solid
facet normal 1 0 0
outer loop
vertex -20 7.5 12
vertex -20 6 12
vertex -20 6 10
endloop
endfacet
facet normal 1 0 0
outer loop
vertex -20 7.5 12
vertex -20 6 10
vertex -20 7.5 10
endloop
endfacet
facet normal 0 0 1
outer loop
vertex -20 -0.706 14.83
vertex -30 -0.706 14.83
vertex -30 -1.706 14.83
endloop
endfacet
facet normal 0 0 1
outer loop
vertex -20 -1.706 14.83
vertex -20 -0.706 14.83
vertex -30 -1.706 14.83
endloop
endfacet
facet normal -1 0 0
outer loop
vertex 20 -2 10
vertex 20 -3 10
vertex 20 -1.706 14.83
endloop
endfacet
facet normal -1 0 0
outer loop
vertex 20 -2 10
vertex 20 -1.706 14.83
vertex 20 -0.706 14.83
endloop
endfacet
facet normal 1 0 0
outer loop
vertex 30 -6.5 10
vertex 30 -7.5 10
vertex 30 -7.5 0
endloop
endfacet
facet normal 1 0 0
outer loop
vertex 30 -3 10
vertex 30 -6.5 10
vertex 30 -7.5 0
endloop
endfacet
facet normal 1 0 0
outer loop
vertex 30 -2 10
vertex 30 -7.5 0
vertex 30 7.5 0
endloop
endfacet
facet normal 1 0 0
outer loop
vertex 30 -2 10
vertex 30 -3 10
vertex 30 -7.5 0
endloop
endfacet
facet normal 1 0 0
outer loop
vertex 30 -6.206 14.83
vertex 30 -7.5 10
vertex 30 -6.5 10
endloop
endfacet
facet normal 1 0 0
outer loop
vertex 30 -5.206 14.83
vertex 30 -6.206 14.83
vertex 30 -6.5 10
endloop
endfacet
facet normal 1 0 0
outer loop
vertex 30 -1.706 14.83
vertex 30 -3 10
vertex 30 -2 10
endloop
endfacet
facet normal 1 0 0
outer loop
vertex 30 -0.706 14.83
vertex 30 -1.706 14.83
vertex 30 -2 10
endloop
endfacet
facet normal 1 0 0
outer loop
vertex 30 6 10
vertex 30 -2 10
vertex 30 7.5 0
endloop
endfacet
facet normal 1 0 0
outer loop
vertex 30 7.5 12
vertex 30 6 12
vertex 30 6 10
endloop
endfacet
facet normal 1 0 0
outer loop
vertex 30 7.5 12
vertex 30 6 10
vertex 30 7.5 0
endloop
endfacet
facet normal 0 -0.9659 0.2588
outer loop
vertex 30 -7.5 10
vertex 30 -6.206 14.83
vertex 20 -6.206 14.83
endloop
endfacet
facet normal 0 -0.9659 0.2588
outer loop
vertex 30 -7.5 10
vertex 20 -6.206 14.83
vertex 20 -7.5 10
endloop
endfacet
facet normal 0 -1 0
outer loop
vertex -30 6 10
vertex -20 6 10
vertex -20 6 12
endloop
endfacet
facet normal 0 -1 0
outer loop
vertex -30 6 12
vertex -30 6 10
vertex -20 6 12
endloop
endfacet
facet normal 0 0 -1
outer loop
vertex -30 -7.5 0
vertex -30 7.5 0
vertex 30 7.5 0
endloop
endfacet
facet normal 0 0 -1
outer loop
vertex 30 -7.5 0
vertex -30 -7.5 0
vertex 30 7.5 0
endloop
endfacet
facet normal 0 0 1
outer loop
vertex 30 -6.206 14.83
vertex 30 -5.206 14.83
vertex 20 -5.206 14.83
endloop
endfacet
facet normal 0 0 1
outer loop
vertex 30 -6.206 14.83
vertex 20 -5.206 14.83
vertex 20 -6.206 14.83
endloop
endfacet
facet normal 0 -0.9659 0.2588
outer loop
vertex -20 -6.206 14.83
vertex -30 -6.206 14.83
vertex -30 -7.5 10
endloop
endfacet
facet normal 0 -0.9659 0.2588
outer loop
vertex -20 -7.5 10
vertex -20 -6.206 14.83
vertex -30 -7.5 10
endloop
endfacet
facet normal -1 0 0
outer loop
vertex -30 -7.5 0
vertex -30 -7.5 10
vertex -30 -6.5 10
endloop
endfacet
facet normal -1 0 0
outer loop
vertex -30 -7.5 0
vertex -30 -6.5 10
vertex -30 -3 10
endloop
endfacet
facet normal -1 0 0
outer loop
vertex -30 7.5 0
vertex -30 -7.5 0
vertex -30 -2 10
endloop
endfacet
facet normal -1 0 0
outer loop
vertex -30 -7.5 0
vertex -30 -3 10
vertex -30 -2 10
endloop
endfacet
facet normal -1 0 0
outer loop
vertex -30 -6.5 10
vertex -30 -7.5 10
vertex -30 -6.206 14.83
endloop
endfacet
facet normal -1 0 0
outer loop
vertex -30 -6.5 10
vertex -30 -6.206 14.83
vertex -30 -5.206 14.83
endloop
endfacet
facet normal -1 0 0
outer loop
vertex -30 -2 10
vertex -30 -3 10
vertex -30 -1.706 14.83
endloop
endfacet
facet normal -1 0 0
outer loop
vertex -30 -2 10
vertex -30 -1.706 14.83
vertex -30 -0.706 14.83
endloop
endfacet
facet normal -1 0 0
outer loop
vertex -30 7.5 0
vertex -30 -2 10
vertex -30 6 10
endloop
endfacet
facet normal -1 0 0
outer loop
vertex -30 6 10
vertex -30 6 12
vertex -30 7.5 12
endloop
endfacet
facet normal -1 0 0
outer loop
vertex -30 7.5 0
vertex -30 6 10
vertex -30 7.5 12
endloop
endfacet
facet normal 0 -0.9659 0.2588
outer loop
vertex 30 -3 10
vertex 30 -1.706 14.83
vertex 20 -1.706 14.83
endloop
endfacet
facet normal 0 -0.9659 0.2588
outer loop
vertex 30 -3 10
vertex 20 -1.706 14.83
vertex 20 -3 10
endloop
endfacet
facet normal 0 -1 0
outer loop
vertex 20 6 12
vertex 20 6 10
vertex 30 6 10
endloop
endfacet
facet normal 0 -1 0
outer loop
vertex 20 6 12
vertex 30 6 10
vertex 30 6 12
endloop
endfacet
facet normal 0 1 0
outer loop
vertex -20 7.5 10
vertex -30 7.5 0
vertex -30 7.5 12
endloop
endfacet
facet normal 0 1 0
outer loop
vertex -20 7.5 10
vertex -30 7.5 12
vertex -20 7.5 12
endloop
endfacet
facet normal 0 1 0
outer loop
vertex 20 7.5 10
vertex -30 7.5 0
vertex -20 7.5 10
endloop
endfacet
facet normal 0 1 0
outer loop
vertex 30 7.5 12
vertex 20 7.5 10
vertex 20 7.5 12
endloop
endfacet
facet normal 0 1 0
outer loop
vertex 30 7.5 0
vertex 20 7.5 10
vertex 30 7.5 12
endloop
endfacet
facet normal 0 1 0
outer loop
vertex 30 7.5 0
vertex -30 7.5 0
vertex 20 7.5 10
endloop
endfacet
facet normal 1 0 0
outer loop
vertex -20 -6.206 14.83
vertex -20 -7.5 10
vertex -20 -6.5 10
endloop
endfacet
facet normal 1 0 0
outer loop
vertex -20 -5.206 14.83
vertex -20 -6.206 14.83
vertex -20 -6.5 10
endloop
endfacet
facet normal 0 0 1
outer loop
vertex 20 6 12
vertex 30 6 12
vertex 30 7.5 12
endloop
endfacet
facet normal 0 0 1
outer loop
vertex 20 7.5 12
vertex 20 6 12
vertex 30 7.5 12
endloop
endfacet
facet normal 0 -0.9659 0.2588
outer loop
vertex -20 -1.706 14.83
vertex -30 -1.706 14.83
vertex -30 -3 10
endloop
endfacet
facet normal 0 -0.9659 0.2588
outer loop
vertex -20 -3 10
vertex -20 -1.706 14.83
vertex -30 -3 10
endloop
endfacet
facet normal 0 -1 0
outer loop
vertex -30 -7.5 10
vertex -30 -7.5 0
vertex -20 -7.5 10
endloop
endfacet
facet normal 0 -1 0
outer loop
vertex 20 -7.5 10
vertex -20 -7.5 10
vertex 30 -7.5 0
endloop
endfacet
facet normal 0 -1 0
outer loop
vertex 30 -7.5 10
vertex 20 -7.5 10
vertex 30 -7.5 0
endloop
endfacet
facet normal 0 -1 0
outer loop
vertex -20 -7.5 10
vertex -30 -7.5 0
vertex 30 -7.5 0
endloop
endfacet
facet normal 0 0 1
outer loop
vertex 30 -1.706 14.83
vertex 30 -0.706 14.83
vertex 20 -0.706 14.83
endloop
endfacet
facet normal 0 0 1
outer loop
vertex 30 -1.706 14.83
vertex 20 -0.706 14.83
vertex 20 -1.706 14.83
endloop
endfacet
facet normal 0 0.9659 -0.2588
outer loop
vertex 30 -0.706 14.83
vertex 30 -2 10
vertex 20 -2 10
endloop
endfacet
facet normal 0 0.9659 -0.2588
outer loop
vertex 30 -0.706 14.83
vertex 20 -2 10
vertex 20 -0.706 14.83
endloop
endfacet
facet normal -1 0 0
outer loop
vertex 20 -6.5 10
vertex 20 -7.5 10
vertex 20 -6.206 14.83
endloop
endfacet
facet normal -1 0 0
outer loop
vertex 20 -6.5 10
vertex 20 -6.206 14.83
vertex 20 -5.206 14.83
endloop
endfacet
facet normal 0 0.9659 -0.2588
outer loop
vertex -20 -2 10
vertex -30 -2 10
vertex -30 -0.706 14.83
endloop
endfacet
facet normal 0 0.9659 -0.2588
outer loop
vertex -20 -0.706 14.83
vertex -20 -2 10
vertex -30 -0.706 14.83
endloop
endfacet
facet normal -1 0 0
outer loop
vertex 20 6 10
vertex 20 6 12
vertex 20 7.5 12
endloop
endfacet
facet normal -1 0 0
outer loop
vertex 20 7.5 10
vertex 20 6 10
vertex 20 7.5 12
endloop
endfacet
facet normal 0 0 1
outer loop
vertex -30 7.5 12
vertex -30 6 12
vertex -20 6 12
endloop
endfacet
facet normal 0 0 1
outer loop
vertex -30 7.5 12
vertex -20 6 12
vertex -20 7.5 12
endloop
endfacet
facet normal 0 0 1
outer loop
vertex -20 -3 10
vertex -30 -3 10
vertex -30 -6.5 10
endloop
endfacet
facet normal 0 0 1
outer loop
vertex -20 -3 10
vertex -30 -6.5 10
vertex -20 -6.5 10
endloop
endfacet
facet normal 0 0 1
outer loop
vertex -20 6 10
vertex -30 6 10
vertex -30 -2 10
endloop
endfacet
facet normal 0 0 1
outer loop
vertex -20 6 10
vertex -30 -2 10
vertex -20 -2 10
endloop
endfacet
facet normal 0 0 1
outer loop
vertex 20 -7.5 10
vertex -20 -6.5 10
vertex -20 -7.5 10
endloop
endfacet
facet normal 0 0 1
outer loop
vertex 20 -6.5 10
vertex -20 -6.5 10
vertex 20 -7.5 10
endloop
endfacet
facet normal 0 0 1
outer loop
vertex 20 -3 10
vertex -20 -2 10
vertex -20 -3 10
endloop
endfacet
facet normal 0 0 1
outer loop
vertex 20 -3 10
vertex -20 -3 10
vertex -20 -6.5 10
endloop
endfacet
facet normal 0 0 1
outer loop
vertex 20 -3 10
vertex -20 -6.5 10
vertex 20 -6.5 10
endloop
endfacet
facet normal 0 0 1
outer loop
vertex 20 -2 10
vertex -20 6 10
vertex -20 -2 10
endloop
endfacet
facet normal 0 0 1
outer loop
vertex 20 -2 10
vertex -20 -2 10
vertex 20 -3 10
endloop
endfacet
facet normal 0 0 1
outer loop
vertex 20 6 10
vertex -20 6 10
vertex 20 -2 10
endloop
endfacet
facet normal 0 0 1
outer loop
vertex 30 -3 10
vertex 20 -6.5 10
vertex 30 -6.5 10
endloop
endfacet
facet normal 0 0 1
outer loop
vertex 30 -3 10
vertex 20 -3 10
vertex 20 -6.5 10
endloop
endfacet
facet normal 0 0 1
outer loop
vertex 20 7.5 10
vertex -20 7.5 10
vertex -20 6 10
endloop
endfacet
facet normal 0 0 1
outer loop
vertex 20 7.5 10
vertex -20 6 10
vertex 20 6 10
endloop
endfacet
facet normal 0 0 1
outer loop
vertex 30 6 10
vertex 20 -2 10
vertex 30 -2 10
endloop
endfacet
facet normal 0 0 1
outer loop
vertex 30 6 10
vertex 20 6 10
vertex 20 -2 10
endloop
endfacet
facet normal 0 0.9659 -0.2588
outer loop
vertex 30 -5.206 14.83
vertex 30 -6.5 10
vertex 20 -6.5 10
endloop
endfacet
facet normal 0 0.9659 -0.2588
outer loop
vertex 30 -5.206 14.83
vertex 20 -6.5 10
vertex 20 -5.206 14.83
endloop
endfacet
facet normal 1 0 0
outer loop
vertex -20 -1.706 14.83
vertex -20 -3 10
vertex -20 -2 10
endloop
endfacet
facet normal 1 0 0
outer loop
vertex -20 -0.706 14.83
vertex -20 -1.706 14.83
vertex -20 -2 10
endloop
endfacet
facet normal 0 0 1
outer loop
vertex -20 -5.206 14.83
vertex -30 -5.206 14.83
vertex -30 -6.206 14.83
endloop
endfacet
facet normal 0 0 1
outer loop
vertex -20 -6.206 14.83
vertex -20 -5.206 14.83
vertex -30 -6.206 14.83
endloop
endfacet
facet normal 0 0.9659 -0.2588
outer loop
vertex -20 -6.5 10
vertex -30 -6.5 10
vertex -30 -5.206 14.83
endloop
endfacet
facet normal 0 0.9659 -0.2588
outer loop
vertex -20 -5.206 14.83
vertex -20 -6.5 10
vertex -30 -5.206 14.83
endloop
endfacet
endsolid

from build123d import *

# Parameters (mm, degrees)
F0_W     = 60
F0_H     = 15
F1_DEPTH = 10
F2_W     = 1.5
F2_H     = 2
F3_DEPTH = 10


with BuildPart() as f1:
    # F0 (on Top) → F1 (new body)
    with BuildSketch(Plane.XY):
        Rectangle(F0_W, F0_H)
    extrude(amount=F1_DEPTH)

    # F2 (on face) → F3 (join)
    with BuildSketch(Plane.YZ.offset(30)):
        Polygon((-6.205905, 14.829629), (-7.5, 10), (-6.5, 10), (-5.205905, 14.829629), align=None)
        Polygon((-3, 10), (-2, 10), (-0.705905, 14.829629), (-1.705905, 14.829629), align=None)
        with Locations((6.75, 11)):
            Rectangle(F2_W, F2_H)
    extrude(amount=-F3_DEPTH)

    # F4: F1 across plane


with BuildPart() as f1_1:
    add(f1.part)
    add(f1.part.mirror(Plane.YZ))


solid = f1_1.part
